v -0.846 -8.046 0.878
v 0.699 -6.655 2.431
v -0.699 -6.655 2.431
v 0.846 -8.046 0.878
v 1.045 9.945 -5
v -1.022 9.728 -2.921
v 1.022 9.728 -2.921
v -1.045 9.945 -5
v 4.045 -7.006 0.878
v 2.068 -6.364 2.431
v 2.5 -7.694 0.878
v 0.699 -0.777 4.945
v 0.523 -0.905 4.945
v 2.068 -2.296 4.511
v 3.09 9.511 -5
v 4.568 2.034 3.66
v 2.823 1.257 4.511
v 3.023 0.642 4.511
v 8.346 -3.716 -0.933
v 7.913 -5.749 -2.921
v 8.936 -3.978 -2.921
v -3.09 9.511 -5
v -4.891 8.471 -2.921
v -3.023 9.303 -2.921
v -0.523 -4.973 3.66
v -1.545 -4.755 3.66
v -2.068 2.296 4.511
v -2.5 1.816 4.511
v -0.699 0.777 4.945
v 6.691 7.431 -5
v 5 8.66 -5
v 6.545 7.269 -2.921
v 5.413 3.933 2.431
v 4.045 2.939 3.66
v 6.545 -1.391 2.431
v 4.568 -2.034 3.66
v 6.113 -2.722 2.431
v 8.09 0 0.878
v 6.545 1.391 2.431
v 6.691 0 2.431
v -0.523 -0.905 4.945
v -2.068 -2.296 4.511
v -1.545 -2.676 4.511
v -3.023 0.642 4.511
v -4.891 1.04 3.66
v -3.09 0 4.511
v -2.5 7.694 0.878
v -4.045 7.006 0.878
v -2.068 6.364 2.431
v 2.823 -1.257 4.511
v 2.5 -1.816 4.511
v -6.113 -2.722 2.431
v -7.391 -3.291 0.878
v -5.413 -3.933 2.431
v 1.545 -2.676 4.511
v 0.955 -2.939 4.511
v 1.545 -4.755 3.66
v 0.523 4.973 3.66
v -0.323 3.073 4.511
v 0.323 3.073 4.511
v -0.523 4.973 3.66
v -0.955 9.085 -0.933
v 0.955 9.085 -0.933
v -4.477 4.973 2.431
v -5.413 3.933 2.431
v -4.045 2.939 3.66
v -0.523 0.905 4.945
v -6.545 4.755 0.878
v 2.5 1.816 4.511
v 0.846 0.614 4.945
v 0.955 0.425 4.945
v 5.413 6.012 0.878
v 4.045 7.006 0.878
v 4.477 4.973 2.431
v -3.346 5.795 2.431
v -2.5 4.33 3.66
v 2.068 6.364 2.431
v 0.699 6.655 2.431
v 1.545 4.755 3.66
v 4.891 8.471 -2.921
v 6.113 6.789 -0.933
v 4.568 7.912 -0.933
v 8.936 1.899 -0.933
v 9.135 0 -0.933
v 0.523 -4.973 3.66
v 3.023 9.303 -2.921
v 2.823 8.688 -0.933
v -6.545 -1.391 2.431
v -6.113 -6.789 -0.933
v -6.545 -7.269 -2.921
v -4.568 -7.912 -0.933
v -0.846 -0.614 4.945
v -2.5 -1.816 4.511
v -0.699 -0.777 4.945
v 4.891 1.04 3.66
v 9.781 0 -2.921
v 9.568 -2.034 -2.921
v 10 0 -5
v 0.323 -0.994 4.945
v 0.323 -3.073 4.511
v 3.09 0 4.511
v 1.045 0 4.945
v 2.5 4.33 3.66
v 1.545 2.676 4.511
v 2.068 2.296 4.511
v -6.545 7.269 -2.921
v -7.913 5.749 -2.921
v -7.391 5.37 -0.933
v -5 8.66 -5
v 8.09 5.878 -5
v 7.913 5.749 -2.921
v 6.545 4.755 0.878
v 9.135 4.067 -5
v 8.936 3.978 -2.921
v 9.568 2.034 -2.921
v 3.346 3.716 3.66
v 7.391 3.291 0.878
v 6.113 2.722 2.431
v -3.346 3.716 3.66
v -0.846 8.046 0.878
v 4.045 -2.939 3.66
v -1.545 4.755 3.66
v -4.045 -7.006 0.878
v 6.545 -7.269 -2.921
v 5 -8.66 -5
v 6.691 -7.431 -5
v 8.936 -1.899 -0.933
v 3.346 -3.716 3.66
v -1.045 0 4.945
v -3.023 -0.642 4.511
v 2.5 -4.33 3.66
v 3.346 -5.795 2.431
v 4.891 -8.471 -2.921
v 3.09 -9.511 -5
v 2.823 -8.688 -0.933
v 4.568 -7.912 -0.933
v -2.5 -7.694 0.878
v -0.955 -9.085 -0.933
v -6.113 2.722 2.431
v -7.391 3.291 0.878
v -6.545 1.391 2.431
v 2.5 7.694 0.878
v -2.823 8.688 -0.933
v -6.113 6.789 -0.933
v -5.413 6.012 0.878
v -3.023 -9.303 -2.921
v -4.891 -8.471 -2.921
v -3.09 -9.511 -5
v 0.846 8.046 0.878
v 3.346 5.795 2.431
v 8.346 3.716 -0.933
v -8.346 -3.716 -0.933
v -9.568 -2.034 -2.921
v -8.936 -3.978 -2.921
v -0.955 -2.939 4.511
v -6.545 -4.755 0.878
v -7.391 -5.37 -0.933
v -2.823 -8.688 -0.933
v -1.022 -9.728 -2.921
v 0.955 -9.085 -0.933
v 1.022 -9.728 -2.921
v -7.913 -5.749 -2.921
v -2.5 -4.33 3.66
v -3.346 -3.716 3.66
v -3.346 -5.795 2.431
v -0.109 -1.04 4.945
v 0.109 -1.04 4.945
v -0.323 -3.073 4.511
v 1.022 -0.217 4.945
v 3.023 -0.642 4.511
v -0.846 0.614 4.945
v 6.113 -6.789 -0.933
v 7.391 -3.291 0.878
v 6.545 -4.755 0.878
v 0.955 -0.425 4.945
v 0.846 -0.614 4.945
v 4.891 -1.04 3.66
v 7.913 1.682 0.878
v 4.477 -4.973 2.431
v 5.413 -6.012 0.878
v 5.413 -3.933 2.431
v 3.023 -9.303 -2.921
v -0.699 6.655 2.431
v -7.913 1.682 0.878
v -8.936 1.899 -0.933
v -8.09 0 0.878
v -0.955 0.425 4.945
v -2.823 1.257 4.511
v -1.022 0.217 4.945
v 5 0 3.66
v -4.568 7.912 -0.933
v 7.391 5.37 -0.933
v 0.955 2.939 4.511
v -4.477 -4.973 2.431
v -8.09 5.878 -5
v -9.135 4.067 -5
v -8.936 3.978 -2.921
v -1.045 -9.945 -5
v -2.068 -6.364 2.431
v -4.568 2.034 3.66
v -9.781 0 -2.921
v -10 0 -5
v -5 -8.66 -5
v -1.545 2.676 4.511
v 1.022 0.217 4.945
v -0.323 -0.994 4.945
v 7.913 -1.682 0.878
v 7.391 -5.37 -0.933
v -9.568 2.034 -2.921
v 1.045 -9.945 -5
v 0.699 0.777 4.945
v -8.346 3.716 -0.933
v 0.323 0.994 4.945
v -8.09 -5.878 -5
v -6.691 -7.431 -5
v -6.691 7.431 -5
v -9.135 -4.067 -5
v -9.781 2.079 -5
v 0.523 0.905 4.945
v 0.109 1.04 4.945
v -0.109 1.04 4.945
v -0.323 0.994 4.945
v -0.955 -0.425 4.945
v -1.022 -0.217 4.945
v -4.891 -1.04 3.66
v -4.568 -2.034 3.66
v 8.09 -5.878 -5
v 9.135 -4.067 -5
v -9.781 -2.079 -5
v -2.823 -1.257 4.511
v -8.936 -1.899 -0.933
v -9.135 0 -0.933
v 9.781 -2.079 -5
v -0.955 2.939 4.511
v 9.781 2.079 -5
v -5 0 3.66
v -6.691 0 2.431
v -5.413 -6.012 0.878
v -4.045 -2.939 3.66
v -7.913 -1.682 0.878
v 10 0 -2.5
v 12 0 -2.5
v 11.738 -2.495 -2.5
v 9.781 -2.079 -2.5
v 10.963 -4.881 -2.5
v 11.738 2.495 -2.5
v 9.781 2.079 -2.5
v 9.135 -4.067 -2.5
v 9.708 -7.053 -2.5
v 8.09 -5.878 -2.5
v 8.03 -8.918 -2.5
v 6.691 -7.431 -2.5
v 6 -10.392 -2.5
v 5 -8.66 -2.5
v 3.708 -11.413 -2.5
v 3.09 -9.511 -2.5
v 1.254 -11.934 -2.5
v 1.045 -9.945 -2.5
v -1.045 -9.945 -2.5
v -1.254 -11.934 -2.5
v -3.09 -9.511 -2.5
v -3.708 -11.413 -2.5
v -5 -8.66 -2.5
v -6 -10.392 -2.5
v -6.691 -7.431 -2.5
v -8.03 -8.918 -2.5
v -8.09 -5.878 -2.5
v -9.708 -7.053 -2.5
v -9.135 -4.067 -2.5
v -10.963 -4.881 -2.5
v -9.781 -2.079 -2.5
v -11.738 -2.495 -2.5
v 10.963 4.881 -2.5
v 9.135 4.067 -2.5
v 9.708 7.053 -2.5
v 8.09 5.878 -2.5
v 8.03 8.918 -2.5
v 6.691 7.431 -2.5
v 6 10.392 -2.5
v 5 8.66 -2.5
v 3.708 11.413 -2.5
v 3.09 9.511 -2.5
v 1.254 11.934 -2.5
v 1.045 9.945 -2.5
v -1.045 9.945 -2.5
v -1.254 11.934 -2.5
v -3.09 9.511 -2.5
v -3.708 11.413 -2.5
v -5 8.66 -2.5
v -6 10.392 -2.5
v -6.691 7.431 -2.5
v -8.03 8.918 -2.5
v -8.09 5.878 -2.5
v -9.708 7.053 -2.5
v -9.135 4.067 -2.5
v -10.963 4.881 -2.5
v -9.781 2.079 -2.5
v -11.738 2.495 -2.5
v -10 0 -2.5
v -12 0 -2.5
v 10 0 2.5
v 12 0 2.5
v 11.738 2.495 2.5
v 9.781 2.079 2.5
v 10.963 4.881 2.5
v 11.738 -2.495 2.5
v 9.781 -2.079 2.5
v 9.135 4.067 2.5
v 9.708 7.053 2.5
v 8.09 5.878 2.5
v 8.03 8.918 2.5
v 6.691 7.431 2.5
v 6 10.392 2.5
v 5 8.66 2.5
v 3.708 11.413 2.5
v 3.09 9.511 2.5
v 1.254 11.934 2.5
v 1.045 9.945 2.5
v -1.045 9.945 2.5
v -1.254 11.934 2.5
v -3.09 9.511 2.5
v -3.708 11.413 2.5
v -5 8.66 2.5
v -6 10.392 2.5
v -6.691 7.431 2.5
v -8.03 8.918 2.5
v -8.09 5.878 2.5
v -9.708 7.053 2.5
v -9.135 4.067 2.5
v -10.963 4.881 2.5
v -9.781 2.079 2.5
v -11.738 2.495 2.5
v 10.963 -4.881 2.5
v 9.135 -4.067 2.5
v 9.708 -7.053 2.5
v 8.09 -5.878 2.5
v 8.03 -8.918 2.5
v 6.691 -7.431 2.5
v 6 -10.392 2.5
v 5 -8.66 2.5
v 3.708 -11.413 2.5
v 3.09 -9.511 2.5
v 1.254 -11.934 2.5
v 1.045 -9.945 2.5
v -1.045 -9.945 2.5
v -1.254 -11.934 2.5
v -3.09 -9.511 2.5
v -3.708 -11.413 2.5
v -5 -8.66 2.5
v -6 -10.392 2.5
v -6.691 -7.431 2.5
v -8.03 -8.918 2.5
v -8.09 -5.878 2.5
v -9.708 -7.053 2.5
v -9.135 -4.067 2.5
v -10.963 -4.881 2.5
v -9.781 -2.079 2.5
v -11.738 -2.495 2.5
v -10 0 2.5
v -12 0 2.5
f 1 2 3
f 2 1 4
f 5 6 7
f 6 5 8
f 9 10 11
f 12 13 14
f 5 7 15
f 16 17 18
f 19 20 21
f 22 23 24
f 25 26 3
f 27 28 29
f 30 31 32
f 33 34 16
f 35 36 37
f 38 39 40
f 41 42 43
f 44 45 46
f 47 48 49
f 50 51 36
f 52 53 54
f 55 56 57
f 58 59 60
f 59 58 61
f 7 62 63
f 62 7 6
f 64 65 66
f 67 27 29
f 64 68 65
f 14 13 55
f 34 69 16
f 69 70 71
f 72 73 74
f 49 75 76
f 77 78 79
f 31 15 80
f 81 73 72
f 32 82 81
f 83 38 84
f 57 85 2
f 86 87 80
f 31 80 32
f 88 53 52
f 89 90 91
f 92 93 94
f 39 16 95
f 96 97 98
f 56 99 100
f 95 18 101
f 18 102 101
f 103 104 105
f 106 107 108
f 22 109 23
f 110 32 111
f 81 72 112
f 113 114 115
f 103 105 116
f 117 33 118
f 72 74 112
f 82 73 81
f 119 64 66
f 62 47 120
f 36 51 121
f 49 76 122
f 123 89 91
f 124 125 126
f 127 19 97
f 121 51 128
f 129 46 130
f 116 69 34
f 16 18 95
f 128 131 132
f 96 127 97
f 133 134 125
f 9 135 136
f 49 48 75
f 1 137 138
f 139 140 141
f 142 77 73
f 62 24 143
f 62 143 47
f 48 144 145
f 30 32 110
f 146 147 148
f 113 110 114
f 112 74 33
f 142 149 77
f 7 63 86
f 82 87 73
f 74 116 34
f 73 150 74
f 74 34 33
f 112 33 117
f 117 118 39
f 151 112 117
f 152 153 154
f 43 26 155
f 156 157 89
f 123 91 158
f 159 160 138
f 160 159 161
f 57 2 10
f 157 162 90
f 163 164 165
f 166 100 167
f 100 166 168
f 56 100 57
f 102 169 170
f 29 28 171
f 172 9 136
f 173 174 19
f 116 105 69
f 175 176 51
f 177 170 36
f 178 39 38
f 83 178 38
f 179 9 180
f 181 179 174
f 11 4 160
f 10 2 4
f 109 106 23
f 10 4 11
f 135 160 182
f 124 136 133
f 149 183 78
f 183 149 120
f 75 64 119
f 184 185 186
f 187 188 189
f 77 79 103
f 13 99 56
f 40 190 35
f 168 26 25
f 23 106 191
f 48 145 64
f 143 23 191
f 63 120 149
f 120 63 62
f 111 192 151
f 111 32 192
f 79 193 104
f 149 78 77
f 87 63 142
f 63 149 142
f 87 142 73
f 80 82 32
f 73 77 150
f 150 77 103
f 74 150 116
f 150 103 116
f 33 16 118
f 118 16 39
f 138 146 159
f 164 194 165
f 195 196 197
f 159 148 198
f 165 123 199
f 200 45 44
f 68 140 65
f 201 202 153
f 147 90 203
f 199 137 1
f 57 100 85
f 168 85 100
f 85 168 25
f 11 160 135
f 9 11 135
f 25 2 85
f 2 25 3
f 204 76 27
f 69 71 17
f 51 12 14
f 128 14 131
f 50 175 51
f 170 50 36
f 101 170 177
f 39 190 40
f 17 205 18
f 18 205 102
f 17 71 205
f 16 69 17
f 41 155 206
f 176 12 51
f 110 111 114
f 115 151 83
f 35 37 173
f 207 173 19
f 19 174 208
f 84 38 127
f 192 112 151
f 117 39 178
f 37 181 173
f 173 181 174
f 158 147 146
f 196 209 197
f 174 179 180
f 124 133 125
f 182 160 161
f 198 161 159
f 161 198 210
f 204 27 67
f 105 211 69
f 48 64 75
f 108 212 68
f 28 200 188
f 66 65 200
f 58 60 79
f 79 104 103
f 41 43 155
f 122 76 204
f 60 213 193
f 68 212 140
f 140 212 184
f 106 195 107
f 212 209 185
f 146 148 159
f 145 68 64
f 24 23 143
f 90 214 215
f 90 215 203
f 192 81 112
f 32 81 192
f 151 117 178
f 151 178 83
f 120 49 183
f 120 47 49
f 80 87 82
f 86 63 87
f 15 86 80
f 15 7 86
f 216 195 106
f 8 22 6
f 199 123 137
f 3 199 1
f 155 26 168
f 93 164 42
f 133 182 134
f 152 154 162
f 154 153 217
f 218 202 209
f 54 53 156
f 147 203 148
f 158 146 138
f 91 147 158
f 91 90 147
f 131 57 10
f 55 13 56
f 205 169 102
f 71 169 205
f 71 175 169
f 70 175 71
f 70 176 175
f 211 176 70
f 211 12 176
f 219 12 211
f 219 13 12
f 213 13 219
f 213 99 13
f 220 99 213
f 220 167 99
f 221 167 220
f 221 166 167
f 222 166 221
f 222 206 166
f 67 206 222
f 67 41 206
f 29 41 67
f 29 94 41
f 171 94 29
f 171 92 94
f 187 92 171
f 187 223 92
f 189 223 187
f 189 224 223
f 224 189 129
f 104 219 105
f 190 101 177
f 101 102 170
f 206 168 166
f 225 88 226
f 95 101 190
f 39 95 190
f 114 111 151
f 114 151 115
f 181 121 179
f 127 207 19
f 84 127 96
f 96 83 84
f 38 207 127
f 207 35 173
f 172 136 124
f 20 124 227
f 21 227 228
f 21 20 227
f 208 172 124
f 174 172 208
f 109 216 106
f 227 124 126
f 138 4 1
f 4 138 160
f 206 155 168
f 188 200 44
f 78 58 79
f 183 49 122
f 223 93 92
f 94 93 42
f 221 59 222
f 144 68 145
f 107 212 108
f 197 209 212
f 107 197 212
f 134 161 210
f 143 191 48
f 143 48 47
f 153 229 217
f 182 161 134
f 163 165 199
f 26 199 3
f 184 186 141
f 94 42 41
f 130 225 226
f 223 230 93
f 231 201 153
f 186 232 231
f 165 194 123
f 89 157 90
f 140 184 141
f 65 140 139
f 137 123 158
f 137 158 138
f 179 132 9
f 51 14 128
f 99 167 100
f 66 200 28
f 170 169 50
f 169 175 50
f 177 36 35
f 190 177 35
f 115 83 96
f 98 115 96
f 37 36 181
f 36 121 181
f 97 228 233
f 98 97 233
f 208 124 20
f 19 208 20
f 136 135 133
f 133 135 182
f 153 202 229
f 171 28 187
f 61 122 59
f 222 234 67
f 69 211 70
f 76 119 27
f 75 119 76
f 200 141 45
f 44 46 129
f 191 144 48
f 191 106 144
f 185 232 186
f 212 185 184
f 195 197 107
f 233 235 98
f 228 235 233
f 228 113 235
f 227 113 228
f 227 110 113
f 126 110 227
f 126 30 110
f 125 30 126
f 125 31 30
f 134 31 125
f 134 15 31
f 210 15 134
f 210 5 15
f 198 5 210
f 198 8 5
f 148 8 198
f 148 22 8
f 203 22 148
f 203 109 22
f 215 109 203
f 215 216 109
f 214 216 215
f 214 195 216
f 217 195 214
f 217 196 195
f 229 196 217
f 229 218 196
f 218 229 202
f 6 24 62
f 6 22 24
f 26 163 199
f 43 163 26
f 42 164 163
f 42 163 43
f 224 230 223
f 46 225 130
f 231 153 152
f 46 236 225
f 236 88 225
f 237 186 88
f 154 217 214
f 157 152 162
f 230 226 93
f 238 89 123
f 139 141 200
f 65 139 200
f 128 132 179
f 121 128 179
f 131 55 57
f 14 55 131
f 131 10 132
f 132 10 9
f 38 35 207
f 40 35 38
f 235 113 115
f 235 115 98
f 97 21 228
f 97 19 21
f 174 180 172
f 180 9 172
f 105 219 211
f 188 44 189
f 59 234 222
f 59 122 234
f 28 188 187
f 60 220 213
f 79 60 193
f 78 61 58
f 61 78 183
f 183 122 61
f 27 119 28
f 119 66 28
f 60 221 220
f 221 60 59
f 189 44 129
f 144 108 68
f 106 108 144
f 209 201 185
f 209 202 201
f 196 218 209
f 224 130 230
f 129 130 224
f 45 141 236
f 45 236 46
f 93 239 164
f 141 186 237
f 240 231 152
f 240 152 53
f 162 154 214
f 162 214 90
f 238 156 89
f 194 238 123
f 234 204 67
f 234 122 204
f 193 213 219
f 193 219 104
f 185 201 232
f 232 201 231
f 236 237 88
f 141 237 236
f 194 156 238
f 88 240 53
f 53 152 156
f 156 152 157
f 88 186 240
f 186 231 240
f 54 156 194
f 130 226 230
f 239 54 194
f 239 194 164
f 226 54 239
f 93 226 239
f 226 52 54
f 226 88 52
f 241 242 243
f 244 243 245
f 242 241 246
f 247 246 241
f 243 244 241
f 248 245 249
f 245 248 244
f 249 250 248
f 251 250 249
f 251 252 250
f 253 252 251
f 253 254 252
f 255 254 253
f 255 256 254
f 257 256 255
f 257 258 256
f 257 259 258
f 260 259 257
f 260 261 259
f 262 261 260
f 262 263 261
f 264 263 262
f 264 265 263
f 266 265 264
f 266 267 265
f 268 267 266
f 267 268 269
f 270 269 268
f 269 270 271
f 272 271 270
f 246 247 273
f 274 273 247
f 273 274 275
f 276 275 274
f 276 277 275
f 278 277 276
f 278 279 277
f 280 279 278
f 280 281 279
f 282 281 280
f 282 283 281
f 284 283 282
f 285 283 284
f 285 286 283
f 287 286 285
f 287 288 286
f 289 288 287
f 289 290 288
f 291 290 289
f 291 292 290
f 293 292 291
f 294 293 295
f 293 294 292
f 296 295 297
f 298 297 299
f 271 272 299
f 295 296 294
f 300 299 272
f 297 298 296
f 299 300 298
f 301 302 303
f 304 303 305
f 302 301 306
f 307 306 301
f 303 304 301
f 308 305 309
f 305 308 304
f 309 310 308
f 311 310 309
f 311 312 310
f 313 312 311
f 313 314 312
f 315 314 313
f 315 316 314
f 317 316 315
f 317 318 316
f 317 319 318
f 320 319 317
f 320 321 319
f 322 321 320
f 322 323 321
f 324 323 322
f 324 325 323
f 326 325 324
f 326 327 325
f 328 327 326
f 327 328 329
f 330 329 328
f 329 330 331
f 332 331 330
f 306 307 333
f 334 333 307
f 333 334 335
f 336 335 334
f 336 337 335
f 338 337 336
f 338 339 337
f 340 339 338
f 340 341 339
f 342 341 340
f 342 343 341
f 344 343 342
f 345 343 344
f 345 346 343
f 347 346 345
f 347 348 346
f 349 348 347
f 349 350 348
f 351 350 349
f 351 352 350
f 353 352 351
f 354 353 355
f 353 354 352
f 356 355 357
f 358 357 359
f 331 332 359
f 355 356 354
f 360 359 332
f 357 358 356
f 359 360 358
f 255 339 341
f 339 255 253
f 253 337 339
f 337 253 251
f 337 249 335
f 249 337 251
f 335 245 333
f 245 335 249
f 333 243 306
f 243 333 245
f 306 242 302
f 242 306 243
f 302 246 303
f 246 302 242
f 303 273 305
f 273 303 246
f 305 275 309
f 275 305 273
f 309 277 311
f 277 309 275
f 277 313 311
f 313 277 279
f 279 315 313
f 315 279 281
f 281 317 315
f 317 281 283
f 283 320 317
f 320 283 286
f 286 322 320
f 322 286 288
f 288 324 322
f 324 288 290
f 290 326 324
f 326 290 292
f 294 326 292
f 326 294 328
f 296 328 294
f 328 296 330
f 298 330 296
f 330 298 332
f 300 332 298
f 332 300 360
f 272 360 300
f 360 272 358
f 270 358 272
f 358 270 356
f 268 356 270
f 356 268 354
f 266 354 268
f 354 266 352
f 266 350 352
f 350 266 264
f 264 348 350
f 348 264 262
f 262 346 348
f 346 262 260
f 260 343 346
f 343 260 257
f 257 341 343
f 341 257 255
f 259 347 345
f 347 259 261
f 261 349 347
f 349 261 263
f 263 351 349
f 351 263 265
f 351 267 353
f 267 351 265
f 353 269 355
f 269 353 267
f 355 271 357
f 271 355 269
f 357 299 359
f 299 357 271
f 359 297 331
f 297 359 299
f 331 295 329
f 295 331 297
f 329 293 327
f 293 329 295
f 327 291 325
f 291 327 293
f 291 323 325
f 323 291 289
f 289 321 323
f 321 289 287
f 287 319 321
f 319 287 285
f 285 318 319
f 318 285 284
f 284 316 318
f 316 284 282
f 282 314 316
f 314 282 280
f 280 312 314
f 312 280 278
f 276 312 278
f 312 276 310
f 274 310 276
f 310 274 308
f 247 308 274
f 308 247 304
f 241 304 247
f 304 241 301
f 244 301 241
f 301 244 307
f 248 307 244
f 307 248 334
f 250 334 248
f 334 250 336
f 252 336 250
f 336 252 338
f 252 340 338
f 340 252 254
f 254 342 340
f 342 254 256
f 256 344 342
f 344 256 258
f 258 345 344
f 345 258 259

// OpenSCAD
dome();
ring();

module dome(d1=20)
{
	color("Blue") translate([0,0,-d1/4])rotate([180,0,0])rotate_extrude() {
		difference() {
			circle(d=d1);
			translate([-d1/2,0,0])square([d1,d1/2]);
			translate([0,-d1/2,0])square([d1/2,d1]);
		}
	}
}

module ring(d1=20, thick=5)
{
	color("Orange")translate([0,0,-thick/2]) linear_extrude(thick) difference()
	{
		circle(d=d1*1.2);
		circle(d=d1);
	}
}
